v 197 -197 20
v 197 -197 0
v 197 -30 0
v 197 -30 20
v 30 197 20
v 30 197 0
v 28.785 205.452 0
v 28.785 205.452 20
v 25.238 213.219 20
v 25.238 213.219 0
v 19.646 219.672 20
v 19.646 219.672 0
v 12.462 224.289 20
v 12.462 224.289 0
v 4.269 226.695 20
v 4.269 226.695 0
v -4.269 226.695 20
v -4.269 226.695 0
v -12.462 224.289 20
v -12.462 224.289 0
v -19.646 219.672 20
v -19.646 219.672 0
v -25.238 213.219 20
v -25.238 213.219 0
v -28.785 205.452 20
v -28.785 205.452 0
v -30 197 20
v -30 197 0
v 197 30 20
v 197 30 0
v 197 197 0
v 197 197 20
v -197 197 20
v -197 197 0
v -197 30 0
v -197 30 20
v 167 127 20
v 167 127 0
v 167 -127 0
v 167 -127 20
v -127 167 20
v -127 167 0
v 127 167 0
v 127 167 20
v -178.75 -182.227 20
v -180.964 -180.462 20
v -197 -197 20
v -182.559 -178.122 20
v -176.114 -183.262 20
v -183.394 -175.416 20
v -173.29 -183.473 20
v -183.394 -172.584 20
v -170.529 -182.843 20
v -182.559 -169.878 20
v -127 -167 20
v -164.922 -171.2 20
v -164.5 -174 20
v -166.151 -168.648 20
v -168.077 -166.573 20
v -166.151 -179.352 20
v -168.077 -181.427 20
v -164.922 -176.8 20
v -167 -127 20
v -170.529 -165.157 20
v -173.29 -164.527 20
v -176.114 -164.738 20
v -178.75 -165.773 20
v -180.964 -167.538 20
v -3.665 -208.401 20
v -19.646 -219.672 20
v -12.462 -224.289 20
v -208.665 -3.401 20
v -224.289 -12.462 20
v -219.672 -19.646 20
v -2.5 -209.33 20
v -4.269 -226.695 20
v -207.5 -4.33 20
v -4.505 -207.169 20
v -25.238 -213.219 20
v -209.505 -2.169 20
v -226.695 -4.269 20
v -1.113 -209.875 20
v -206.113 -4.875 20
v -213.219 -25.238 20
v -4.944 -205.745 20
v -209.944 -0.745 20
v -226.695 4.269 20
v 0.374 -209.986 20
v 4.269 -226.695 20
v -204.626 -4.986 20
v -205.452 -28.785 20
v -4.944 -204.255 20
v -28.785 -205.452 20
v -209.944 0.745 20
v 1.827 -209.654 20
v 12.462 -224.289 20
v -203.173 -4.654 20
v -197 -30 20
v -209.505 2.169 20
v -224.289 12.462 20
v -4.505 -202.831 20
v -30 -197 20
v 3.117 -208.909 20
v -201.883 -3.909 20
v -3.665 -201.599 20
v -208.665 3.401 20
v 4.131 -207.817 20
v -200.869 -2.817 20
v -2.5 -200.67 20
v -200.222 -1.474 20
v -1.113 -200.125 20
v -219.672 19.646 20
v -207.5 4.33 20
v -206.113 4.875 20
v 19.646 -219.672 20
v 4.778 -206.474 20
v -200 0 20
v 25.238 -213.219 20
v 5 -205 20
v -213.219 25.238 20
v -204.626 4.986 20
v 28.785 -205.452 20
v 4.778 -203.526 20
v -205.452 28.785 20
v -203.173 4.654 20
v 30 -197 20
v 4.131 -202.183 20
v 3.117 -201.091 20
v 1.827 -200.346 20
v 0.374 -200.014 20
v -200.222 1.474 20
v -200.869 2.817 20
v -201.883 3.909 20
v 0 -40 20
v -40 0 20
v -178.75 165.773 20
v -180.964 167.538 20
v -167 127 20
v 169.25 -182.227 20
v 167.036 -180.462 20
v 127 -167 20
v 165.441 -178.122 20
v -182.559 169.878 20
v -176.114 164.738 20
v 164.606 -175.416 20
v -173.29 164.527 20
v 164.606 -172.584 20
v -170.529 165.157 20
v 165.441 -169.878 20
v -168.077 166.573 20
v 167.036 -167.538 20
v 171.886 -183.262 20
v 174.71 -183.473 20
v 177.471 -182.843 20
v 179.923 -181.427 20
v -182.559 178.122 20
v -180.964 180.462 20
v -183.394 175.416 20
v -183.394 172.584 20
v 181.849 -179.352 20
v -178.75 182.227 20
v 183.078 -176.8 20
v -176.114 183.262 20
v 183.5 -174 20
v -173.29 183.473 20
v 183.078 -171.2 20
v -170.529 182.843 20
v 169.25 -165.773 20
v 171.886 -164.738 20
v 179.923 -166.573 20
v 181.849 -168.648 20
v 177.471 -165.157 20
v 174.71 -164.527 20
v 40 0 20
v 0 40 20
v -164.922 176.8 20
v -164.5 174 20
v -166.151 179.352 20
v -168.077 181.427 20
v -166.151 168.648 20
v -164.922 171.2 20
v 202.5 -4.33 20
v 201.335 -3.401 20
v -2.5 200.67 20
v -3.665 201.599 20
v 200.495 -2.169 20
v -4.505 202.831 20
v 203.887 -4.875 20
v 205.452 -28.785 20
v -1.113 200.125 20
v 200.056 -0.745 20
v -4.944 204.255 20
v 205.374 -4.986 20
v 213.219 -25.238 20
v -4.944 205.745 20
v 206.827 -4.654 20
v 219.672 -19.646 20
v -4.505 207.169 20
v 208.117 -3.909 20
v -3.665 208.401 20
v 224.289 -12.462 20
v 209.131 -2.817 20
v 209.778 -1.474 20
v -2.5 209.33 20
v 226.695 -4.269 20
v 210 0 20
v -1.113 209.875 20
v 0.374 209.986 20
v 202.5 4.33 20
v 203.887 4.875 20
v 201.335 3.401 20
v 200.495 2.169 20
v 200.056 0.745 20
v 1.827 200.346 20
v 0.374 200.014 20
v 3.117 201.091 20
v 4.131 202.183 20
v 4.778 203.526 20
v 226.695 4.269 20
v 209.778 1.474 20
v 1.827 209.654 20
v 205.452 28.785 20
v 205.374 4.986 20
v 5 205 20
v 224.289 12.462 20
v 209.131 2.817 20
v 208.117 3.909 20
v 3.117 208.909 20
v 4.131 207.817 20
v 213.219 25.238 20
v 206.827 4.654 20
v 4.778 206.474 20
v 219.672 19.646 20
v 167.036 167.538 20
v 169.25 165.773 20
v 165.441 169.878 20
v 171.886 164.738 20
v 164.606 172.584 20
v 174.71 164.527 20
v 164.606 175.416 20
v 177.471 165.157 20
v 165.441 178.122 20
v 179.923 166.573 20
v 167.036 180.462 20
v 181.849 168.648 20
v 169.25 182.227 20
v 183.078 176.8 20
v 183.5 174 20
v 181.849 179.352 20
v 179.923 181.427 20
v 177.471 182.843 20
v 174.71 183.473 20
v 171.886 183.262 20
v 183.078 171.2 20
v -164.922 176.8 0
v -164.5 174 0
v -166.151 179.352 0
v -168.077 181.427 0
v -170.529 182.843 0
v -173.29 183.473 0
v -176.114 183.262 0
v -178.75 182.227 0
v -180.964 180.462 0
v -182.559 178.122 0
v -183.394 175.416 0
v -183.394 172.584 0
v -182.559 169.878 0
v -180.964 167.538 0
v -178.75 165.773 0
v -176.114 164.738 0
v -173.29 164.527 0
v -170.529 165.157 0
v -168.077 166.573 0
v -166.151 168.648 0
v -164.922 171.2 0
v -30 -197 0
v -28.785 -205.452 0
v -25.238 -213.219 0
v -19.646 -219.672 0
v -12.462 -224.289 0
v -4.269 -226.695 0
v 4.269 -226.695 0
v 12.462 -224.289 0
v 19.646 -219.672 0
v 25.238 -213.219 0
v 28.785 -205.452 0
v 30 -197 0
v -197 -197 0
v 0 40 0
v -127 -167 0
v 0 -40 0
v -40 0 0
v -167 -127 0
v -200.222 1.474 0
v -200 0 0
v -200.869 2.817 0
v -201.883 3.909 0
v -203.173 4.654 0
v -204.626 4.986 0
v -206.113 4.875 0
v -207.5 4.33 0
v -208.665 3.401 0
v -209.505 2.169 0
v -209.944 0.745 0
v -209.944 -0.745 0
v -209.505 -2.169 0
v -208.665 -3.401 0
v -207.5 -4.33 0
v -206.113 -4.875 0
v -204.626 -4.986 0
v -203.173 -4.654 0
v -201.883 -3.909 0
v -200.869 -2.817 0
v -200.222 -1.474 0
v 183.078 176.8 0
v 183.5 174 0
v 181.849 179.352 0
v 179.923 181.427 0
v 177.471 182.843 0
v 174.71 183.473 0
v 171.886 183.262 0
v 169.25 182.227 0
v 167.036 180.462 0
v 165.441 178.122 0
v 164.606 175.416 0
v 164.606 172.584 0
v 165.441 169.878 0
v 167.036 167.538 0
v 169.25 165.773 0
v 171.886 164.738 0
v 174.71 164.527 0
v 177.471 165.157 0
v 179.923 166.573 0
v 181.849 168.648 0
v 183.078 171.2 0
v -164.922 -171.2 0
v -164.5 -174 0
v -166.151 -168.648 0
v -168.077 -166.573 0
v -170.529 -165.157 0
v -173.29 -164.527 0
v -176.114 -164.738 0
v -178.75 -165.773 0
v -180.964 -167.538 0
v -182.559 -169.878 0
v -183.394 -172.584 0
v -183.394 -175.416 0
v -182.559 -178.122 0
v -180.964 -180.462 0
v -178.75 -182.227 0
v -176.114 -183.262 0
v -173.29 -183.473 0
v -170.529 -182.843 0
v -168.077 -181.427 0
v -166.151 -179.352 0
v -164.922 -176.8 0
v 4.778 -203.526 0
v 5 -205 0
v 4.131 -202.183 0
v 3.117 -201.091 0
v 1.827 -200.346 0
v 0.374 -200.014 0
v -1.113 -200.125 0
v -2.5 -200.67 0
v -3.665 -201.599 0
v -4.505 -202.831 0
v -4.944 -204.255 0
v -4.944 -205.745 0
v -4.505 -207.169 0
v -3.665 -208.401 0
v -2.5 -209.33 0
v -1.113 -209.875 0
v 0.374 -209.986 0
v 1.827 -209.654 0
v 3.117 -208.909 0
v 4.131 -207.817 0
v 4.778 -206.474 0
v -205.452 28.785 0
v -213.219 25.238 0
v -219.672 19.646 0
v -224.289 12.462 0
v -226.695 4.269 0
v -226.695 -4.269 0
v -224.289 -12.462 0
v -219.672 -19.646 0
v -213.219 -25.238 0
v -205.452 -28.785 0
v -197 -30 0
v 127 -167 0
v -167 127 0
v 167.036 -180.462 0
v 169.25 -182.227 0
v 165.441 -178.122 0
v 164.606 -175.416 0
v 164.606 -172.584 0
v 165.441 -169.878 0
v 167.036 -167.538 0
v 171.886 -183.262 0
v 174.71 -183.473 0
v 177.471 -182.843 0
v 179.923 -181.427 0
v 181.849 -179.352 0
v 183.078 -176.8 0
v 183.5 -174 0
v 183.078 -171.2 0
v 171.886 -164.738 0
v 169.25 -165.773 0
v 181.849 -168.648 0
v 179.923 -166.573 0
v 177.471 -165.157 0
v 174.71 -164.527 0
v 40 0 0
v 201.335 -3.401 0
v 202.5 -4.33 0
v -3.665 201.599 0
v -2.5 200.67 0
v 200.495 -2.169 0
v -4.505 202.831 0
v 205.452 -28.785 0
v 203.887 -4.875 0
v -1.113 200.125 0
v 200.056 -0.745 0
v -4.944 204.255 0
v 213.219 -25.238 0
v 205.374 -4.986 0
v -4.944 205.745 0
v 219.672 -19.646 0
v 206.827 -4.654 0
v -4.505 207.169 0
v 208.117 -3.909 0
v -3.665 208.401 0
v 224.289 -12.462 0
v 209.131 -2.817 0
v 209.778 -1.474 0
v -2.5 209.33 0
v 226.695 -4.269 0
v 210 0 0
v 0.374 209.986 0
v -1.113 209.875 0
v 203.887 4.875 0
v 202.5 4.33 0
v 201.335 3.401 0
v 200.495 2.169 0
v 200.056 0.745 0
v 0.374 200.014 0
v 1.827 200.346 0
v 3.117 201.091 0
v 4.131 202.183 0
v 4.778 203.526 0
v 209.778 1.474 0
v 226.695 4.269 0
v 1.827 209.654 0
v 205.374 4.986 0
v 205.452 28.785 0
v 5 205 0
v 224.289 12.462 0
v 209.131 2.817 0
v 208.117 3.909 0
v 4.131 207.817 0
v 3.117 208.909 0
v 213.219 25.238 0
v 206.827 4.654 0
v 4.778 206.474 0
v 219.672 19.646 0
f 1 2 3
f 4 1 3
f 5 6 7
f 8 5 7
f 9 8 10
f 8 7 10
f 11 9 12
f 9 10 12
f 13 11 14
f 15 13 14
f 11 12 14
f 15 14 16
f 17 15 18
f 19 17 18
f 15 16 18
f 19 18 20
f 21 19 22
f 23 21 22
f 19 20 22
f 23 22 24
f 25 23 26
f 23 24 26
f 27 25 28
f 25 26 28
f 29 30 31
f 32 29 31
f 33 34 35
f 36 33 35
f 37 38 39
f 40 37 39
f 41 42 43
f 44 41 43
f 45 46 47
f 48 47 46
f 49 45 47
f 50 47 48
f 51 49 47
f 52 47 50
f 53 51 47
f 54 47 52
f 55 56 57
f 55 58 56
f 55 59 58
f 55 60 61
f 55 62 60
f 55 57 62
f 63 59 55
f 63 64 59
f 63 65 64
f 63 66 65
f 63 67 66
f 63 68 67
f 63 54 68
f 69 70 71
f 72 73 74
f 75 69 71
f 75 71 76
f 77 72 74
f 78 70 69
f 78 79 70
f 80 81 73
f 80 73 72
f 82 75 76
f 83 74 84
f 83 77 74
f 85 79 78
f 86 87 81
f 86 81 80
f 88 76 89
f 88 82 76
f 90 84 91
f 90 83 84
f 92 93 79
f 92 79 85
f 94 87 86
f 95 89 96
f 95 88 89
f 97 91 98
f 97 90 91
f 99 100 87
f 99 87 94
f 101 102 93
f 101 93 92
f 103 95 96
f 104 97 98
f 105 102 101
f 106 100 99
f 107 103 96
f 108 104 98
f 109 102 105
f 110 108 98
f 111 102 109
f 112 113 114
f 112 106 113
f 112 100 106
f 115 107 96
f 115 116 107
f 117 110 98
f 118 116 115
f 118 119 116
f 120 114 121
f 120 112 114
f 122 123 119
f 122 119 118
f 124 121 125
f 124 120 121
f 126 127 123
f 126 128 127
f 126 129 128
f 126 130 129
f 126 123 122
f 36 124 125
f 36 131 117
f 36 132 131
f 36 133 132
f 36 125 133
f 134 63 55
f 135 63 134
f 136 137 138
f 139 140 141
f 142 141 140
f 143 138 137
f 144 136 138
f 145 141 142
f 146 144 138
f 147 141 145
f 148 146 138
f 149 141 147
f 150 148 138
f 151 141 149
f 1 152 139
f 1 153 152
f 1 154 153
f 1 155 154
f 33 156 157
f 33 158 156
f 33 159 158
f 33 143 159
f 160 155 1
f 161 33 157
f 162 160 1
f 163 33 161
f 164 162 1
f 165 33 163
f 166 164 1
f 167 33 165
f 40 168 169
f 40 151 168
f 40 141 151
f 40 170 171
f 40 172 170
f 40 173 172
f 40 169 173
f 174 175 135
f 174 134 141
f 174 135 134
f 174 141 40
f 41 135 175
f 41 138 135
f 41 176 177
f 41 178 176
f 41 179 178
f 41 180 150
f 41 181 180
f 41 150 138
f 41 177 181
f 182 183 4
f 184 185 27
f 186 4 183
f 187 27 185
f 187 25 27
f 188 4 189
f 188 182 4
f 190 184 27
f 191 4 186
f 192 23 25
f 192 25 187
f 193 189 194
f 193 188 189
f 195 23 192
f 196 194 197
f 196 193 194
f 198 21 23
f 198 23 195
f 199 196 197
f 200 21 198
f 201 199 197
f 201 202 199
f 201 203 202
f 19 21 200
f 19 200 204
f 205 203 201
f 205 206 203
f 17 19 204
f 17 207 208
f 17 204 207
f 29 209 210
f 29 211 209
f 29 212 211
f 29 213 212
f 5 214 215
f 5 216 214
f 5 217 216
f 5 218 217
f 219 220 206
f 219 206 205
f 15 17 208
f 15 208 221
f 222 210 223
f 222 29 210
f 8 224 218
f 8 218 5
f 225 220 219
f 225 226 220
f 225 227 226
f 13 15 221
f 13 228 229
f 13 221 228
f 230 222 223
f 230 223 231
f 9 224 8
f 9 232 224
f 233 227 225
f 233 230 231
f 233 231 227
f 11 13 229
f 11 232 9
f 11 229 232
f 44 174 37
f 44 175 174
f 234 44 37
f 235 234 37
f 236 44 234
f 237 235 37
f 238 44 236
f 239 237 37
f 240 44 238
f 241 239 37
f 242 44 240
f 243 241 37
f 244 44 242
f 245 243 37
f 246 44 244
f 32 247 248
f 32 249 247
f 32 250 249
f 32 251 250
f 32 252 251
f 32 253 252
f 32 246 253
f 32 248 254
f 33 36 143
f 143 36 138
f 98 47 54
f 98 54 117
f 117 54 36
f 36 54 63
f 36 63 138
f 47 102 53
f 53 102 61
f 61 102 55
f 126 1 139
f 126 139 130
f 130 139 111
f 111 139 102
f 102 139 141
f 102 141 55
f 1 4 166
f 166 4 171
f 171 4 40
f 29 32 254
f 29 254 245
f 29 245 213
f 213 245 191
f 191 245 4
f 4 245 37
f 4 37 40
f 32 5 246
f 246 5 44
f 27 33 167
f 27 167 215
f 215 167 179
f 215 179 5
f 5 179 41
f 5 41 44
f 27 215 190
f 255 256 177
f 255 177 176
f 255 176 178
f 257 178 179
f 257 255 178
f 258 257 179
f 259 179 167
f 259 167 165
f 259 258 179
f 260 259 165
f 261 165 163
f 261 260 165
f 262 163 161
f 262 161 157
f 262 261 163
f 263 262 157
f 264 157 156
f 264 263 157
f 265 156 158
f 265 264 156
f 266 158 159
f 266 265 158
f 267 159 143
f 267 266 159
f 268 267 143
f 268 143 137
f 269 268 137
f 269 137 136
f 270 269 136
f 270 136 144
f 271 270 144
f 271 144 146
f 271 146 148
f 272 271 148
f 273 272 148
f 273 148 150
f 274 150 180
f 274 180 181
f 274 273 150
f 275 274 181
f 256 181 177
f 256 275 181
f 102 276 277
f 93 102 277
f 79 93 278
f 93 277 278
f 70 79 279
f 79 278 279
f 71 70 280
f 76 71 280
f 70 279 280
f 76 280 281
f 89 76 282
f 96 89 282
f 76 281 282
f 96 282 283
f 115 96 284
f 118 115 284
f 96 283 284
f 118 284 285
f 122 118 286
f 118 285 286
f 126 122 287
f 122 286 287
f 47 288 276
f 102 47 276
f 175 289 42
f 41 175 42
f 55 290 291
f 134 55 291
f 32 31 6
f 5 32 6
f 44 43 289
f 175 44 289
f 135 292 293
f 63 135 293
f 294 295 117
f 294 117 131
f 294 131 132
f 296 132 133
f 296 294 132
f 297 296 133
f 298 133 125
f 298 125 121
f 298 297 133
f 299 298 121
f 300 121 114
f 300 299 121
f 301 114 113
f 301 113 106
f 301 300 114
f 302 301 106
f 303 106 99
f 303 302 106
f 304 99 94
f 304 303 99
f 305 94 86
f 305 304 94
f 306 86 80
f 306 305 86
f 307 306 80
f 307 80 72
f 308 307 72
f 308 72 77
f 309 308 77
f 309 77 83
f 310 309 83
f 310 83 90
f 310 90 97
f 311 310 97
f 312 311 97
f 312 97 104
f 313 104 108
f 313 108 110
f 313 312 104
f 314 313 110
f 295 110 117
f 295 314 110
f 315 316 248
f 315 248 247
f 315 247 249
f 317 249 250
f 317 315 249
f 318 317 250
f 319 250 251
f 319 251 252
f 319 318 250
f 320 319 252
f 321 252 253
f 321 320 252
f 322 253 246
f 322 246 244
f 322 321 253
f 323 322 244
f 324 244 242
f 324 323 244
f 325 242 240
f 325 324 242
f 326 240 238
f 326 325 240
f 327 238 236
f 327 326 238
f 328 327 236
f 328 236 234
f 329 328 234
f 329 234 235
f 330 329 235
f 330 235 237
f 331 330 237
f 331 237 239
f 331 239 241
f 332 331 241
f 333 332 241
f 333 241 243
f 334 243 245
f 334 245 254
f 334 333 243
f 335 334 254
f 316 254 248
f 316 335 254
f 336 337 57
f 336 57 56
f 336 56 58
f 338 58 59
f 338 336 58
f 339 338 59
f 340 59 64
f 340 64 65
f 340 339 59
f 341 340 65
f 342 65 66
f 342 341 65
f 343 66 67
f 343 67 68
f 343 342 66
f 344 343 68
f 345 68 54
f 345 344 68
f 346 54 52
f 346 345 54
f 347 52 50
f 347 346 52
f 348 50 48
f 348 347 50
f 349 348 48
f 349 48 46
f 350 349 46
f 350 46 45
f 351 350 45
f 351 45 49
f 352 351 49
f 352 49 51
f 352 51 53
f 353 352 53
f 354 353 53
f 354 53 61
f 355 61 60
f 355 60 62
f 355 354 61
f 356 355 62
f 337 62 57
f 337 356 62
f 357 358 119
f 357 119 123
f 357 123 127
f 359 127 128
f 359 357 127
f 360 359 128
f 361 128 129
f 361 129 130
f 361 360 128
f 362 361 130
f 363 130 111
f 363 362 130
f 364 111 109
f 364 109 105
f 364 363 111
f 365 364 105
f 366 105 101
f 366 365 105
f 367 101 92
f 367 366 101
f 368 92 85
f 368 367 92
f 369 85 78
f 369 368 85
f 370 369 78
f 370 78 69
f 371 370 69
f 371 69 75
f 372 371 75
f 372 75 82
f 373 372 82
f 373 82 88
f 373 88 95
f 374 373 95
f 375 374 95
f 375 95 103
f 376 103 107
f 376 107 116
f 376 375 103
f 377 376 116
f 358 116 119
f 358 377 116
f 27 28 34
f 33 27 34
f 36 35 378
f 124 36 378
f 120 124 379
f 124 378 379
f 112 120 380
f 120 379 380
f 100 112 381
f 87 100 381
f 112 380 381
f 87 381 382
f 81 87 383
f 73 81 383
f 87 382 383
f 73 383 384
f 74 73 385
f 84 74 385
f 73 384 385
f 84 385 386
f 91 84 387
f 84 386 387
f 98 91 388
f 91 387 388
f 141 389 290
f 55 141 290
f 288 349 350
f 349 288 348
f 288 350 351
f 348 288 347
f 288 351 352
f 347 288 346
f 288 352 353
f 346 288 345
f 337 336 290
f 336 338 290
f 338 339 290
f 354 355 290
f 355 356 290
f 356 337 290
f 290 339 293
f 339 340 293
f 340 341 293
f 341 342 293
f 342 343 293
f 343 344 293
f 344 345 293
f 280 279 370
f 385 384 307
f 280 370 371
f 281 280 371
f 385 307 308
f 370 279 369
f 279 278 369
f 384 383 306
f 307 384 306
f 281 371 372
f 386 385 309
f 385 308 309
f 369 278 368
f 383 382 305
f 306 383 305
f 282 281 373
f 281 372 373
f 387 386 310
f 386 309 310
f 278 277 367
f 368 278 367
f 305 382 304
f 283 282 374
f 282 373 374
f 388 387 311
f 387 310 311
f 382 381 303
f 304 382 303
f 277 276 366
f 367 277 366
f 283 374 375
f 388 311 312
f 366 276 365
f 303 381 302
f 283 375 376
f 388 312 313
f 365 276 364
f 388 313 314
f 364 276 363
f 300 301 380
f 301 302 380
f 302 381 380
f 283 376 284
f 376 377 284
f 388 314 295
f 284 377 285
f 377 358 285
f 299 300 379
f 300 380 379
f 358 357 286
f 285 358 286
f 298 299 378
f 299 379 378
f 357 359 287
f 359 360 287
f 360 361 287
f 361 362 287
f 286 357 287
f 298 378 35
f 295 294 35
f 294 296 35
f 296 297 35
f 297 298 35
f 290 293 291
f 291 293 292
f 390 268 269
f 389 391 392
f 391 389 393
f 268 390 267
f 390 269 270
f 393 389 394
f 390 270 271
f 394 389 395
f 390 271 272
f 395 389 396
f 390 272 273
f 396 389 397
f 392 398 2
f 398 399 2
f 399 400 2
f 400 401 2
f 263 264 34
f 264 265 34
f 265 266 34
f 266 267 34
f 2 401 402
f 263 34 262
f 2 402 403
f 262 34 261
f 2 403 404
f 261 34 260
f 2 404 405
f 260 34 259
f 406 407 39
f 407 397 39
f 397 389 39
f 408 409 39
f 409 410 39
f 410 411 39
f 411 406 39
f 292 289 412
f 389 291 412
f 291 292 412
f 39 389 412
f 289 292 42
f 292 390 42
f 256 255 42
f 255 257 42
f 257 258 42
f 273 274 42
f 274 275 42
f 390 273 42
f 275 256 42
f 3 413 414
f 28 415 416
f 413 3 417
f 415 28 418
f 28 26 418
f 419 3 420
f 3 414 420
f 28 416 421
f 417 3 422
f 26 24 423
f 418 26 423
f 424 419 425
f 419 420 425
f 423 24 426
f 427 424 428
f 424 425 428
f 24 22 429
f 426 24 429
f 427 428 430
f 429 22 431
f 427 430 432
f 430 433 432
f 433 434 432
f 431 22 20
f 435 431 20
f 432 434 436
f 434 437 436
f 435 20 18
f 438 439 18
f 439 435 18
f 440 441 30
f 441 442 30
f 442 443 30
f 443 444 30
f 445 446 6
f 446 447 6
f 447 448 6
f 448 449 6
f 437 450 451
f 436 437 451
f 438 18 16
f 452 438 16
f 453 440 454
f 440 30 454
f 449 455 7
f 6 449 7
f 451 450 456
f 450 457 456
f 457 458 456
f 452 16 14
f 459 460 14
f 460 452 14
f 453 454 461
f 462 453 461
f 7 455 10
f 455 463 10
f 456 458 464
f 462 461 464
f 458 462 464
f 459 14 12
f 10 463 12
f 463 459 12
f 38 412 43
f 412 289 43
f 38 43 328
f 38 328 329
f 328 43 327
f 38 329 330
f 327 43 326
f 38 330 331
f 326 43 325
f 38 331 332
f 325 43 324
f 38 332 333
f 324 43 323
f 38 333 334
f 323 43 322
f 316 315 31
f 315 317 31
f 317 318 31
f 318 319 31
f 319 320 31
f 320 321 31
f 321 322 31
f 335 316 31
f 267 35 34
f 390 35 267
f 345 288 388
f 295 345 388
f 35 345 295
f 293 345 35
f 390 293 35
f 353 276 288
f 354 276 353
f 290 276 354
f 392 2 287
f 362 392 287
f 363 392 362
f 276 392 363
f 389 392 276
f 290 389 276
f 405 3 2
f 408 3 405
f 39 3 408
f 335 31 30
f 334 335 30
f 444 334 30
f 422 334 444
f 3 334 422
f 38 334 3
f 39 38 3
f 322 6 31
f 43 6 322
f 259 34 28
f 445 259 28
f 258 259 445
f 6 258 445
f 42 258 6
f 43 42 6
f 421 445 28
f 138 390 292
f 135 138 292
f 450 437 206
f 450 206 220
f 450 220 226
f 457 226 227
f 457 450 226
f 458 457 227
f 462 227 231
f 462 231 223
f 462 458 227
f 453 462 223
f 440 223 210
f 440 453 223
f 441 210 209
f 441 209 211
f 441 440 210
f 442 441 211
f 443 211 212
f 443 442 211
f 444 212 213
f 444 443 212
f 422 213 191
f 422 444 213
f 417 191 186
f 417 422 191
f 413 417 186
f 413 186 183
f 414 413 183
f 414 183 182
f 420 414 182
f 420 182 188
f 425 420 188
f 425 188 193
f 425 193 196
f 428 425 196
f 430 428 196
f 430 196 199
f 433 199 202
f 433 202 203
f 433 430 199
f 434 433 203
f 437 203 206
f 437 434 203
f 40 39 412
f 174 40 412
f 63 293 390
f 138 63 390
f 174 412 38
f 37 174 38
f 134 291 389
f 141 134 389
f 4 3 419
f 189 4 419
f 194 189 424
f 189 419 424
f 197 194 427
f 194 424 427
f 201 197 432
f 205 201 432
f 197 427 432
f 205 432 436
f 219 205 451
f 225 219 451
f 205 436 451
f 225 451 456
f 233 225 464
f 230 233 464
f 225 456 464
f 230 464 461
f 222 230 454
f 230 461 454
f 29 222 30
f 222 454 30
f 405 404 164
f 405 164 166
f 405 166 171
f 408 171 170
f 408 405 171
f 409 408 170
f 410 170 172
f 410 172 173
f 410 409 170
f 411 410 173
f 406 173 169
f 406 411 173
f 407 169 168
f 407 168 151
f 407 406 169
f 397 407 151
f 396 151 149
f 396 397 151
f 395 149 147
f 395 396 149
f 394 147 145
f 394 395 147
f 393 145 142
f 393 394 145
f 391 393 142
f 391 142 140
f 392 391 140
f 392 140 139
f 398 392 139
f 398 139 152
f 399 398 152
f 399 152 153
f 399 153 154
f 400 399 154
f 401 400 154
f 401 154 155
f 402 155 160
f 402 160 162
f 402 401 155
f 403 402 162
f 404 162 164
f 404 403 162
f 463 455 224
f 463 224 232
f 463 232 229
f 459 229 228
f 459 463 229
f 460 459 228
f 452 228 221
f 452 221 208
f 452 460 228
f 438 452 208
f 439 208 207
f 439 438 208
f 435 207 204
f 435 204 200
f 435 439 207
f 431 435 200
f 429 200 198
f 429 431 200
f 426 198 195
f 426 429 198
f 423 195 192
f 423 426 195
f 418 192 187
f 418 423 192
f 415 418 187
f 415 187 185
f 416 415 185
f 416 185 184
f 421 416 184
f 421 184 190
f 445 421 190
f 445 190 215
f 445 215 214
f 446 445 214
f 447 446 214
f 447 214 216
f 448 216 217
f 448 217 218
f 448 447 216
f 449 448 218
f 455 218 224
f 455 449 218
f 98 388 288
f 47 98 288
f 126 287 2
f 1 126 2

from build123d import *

# Parameters (mm, degrees)
F0_R     = 9.5
F0_R_2   = 5
F1_DEPTH = 20


with BuildPart() as f1:
    # F0 (on Top) → F1 (new body)
    with BuildSketch(Plane.XY):
        Polygon((-197, 127), (-167, 127), (-127, 167), (-127, 197), (-197, 197), align=None)
        with Locations((-174, 174)):
            Circle(F0_R, mode=Mode.SUBTRACT)
        Polygon((-167, -127), (-167, 127), (-197, 127), (-197, 30), (-197, -30), (-197, -127), align=None)
        Polygon((-127, 197), (-127, 167), (127, 167), (127, 197), (30, 197), (-30, 197), align=None)
        Polygon((-127, -167), (-167, -127), (-197, -127), (-197, -197), (-127, -197), align=None)
        with Locations((-174, -174)):
            Circle(F0_R, mode=Mode.SUBTRACT)
        Polygon((127, 197), (127, 167), (167, 127), (197, 127), (197, 197), align=None)
        with Locations((174, 174)):
            Circle(F0_R, mode=Mode.SUBTRACT)
        with BuildLine():
            Line((-197, -30), (-197, 30))
            ThreePointArc((-197, 30), (-227, 0), (-197, -30))
        make_face()
        with Locations((-205, 0)):
            Circle(F0_R_2, mode=Mode.SUBTRACT)
        Polygon((127, -167), (-127, -167), (-127, -197), (-30, -197), (30, -197), (127, -197), align=None)
        with BuildLine():
            ThreePointArc((30, 197), (0, 227), (-30, 197))
            Line((-30, 197), (30, 197))
        make_face()
        with Locations((0, 205)):
            Circle(F0_R_2, mode=Mode.SUBTRACT)
        Polygon((197, 127), (167, 127), (167, -127), (197, -127), (197, -30), (197, 30), align=None)
        Polygon((167, -127), (127, -167), (127, -197), (197, -197), (197, -127), align=None)
        with Locations((174, -174)):
            Circle(F0_R, mode=Mode.SUBTRACT)
        with BuildLine():
            Line((30, -197), (-30, -197))
            ThreePointArc((-30, -197), (0, -227), (30, -197))
        make_face()
        with Locations((0, -205)):
            Circle(F0_R_2, mode=Mode.SUBTRACT)
        with BuildLine():
            ThreePointArc((197, -30), (227, 0), (197, 30))
            Line((197, 30), (197, -30))
        make_face()
        with Locations((205, 0)):
            Circle(F0_R_2, mode=Mode.SUBTRACT)
        Polygon((40, 0), (0, -40), (127, -167), (167, -127), align=None)
        Polygon((-40, 0), (-167, -127), (-127, -167), (0, -40), align=None)
        Polygon((-127, 167), (-167, 127), (-40, 0), (0, 40), align=None)
        Polygon((0, 40), (-40, 0), (0, -40), (40, 0), align=None)
        Polygon((167, 127), (127, 167), (0, 40), (40, 0), align=None)
    extrude(amount=F1_DEPTH)


solid = f1.part
